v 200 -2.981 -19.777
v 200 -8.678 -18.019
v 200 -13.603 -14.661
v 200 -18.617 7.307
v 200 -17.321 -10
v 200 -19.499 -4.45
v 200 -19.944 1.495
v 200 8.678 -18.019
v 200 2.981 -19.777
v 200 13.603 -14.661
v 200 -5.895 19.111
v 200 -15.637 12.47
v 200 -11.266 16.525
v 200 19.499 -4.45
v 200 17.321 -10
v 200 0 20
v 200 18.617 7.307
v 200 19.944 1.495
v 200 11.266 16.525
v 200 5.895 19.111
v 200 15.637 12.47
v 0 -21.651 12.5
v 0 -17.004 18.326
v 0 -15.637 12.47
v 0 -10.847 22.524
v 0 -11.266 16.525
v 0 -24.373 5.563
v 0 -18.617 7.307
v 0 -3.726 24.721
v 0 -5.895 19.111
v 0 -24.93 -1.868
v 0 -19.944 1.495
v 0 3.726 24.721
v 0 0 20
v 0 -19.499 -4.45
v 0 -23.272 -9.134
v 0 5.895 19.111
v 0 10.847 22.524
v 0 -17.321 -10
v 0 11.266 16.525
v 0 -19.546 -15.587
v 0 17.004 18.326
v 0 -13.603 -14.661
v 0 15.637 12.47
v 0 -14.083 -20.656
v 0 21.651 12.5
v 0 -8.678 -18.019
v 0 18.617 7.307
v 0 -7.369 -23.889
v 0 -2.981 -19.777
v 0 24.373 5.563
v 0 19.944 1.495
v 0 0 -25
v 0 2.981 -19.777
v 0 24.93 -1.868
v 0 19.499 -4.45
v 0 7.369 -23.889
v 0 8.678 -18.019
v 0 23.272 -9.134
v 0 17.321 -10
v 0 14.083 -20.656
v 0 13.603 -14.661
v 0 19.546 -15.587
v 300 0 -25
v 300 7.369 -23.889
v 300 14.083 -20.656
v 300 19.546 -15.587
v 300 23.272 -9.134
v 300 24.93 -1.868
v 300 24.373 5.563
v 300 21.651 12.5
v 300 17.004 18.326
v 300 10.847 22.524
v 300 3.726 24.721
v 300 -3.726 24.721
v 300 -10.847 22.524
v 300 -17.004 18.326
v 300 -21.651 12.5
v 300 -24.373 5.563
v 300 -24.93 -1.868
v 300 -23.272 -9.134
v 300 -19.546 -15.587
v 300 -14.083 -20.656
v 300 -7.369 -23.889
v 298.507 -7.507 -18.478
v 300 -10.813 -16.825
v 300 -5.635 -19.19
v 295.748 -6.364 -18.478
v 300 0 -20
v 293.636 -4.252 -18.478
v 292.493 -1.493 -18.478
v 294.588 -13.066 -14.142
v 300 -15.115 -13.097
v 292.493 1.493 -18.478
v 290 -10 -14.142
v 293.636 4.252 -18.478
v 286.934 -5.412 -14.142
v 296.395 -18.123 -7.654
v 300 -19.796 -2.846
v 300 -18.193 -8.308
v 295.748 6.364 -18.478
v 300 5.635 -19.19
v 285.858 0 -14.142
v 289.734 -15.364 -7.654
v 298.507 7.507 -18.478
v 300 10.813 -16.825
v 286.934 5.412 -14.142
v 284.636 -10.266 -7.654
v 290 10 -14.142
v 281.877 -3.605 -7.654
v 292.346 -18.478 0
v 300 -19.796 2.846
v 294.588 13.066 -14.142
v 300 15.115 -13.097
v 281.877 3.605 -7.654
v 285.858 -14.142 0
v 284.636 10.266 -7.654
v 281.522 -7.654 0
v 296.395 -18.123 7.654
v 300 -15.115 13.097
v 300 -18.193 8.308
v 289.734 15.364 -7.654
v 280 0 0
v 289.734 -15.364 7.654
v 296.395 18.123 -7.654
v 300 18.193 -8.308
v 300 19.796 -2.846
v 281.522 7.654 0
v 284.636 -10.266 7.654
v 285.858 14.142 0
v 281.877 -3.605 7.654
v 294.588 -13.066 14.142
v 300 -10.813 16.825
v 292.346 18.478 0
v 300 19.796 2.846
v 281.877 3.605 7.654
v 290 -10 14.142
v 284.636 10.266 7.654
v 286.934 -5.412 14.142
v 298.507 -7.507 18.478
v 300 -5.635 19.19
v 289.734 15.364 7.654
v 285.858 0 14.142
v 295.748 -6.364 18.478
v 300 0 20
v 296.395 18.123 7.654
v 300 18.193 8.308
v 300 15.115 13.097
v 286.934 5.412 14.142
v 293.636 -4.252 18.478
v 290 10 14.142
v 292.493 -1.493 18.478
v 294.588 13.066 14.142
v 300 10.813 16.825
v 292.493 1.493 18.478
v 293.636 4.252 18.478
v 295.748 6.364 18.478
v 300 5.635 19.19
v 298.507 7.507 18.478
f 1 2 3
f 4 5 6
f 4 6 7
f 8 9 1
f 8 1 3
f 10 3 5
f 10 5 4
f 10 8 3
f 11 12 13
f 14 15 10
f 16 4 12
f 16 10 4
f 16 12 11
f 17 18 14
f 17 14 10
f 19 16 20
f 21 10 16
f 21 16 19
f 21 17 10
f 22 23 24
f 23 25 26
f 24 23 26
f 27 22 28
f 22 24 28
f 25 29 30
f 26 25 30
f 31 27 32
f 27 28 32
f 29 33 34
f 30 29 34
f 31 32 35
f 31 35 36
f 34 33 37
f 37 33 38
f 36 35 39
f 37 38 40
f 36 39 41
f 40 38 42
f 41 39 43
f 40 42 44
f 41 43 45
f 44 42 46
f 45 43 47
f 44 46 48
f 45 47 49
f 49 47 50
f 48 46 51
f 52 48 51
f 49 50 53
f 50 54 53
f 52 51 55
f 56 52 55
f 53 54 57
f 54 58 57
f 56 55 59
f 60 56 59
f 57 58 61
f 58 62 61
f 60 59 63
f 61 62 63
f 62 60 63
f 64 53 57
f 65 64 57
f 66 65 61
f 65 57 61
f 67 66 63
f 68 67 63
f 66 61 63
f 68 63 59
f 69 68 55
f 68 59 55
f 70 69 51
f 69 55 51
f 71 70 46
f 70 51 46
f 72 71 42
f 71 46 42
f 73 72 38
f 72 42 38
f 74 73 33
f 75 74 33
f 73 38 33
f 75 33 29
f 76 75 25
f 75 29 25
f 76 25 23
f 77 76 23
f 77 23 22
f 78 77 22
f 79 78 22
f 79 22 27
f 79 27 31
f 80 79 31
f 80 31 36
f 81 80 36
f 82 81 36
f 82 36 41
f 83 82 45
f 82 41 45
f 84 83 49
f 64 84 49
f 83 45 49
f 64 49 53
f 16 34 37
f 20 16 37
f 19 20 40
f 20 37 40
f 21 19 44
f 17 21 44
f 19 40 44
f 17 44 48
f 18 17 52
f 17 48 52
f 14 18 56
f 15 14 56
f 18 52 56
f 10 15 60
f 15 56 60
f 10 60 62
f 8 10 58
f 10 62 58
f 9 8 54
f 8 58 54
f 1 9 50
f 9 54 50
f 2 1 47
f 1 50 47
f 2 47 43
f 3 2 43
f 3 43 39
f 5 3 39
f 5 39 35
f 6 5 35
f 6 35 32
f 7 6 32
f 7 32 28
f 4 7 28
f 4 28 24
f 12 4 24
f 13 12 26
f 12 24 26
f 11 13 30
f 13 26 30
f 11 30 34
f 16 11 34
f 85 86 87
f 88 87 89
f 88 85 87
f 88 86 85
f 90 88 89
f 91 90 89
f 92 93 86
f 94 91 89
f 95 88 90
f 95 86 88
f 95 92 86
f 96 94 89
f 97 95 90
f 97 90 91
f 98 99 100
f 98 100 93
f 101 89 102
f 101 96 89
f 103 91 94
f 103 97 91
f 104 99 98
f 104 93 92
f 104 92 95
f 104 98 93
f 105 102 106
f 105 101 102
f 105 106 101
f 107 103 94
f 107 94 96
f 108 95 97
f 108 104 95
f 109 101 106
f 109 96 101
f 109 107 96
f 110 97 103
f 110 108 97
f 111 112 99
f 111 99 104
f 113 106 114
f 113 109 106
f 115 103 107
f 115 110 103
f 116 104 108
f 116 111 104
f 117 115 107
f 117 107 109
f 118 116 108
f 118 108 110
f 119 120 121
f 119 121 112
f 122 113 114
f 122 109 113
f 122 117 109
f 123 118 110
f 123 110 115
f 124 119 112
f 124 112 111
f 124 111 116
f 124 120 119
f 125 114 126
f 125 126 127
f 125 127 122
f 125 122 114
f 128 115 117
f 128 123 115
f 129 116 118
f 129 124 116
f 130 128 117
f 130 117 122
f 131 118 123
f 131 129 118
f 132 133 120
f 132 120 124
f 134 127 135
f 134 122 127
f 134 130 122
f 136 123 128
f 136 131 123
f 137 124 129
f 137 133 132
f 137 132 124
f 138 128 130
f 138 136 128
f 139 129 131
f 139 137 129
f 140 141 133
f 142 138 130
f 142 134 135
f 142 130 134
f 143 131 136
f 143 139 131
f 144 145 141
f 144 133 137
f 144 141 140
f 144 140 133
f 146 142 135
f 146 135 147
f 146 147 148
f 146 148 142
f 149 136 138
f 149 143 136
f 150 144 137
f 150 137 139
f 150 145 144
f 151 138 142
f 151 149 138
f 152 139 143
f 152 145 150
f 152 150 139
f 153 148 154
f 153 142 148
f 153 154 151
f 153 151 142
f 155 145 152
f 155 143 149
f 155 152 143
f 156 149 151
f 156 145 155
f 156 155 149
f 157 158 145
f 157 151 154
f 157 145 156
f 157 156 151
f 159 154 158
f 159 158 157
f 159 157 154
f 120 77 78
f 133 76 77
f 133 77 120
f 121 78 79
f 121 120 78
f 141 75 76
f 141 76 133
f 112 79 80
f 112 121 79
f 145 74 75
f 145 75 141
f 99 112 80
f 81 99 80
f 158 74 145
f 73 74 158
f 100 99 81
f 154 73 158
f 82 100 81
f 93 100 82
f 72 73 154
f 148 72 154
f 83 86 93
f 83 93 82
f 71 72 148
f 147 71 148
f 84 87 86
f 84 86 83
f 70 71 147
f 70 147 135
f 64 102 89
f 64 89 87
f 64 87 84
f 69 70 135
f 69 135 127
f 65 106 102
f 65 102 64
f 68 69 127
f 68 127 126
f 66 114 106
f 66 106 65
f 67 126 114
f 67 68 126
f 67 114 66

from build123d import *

# Parameters (mm, degrees)
SKETCH1_R           = 25
BOSS_EXTRUDE1_DEPTH = 300
SKETCH3_R           = 20
CUT_EXTRUDE1_DEPTH  = 200


with BuildPart() as part:
    # Sketch1 → Boss-Extrude1 (new body)
    with BuildSketch(Plane(origin=(0, 0, 0), x_dir=(0, 0, -1), z_dir=(1, 0, 0))):
        Circle(SKETCH1_R)
    extrude(amount=BOSS_EXTRUDE1_DEPTH)

    # Sketch2 → Cut-Revolve3 (revolve, cut)
    with BuildSketch(Plane(origin=(300, 0, 0), x_dir=(0, 0, -1), z_dir=(1, 0, 0))):
        with BuildLine():
            Line((-20, 0), (20, 0))
            ThreePointArc((20, 0), (0, 20), (-20, 0))
        make_face()
    revolve(axis=Axis((300, 0, 20), (0, 0, -1)), mode=Mode.SUBTRACT)

    # Sketch3 → Cut-Extrude1 (cut)
    with BuildSketch(Plane.ZY):
        Circle(SKETCH3_R)
    extrude(amount=-CUT_EXTRUDE1_DEPTH, mode=Mode.SUBTRACT)


solid = part.part
